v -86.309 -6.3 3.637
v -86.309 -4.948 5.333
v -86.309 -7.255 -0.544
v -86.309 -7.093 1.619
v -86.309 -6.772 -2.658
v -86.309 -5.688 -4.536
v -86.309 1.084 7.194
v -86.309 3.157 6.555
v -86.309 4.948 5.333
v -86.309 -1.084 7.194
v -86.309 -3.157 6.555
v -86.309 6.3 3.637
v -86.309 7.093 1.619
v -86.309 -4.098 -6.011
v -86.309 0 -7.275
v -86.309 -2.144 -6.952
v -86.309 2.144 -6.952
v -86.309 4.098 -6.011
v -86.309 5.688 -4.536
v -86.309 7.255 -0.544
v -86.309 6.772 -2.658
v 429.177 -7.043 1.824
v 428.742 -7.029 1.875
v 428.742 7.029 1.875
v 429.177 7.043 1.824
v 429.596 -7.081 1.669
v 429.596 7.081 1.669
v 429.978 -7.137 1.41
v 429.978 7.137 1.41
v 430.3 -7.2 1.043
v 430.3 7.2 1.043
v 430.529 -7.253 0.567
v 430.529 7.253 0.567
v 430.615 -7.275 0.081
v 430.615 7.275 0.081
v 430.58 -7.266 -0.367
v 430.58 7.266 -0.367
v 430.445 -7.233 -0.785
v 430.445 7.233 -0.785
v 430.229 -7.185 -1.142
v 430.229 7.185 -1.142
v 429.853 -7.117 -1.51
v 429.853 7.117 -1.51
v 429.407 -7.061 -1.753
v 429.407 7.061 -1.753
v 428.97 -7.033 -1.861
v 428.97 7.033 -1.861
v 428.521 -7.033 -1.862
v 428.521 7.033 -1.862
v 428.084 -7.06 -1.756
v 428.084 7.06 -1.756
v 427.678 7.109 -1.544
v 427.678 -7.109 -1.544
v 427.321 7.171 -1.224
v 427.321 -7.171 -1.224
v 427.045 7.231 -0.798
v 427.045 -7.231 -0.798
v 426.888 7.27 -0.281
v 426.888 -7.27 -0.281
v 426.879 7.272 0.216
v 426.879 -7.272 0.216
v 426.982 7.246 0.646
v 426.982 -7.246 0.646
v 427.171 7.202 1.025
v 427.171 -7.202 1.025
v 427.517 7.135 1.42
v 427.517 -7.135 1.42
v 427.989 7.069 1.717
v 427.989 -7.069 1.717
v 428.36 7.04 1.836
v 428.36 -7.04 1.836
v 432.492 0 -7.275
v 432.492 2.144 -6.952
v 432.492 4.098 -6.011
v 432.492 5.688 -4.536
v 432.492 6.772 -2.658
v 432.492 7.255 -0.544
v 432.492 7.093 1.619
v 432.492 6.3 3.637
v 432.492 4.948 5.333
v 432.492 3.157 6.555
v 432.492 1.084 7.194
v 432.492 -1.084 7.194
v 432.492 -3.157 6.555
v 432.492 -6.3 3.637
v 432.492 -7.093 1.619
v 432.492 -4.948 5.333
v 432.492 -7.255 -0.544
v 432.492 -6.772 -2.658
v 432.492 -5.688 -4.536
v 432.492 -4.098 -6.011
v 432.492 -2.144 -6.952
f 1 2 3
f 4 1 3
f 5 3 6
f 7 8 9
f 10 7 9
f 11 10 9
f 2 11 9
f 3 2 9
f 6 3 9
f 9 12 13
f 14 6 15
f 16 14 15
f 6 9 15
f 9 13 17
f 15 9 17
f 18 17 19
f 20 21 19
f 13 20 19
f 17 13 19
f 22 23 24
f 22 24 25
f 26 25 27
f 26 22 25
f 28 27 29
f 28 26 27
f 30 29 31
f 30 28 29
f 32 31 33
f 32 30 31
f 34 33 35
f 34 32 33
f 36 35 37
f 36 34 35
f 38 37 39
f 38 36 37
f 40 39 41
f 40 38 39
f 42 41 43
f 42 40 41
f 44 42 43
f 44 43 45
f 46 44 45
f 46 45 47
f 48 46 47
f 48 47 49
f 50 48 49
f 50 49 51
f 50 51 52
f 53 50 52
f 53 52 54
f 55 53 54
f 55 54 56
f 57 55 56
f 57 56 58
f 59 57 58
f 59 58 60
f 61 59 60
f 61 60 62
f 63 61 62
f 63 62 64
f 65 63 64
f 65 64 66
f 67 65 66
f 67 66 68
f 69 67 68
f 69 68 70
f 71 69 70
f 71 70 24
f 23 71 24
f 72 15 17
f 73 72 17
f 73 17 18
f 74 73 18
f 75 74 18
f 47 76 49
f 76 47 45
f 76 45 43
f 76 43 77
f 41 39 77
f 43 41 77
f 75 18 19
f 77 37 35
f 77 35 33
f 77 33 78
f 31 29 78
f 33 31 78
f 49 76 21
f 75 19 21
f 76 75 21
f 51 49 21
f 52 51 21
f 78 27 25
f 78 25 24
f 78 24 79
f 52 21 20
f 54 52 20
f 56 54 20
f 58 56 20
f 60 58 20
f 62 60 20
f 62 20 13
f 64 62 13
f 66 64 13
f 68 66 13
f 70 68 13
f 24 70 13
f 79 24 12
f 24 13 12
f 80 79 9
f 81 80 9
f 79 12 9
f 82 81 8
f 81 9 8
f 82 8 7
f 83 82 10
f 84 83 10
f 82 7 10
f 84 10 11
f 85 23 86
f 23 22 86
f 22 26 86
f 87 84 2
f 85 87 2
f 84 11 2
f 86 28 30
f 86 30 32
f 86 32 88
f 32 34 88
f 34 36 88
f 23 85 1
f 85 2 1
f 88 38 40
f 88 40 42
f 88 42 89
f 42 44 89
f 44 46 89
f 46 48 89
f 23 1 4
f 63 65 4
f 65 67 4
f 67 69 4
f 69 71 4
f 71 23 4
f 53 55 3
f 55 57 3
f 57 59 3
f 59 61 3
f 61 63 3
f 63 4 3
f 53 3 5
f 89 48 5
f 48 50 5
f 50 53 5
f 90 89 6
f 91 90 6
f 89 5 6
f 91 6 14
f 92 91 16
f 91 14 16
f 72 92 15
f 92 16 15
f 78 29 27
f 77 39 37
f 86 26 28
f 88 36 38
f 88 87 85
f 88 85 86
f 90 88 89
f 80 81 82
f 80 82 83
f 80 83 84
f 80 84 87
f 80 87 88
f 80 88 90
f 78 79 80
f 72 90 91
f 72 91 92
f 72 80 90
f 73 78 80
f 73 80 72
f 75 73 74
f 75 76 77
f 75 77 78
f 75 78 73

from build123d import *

# Parameters (mm, degrees)
SKETCH1_R               = 4.85
BOSS_EXTRUDE1_DEPTH     = 345.867201
CUT_EXTRUDE1_DEPTH      = 346.935204522
CUT_EXTRUDE1_DEPTH_BACK = 346.935204522
SKETCH2_R               = 1.25
SCALE1_SCALE            = 1.5


with BuildPart() as part:
    # Sketch1 → Boss-Extrude1 (new body)
    with BuildSketch(Plane(origin=(0, 0, 0), x_dir=(0, 0, -1), z_dir=(1, 0, 0))):
        Circle(SKETCH1_R)
    extrude(amount=BOSS_EXTRUDE1_DEPTH)

    # Sketch2 → Cut-Extrude1 (cut, two sides: drawn at the far end of the back side and taken through both)
    with BuildSketch(Plane(origin=(0, 0, 0), x_dir=(1, 0, 0), z_dir=(0, 1, 0)).offset(-CUT_EXTRUDE1_DEPTH_BACK)):
        with Locations(Location((343.367201, 0, 0), (0, 0, 270))):
            Circle(SKETCH2_R)
    extrude(amount=CUT_EXTRUDE1_DEPTH + CUT_EXTRUDE1_DEPTH_BACK, mode=Mode.SUBTRACT)


with BuildPart() as part_1:
    # Scale1: scaled about (172.618275836, 0, 1.121e-06)
    add(part.part.scale(SCALE1_SCALE).moved(Location((-86.309137918, 0, -5.6e-07))))


solid = part_1.part
